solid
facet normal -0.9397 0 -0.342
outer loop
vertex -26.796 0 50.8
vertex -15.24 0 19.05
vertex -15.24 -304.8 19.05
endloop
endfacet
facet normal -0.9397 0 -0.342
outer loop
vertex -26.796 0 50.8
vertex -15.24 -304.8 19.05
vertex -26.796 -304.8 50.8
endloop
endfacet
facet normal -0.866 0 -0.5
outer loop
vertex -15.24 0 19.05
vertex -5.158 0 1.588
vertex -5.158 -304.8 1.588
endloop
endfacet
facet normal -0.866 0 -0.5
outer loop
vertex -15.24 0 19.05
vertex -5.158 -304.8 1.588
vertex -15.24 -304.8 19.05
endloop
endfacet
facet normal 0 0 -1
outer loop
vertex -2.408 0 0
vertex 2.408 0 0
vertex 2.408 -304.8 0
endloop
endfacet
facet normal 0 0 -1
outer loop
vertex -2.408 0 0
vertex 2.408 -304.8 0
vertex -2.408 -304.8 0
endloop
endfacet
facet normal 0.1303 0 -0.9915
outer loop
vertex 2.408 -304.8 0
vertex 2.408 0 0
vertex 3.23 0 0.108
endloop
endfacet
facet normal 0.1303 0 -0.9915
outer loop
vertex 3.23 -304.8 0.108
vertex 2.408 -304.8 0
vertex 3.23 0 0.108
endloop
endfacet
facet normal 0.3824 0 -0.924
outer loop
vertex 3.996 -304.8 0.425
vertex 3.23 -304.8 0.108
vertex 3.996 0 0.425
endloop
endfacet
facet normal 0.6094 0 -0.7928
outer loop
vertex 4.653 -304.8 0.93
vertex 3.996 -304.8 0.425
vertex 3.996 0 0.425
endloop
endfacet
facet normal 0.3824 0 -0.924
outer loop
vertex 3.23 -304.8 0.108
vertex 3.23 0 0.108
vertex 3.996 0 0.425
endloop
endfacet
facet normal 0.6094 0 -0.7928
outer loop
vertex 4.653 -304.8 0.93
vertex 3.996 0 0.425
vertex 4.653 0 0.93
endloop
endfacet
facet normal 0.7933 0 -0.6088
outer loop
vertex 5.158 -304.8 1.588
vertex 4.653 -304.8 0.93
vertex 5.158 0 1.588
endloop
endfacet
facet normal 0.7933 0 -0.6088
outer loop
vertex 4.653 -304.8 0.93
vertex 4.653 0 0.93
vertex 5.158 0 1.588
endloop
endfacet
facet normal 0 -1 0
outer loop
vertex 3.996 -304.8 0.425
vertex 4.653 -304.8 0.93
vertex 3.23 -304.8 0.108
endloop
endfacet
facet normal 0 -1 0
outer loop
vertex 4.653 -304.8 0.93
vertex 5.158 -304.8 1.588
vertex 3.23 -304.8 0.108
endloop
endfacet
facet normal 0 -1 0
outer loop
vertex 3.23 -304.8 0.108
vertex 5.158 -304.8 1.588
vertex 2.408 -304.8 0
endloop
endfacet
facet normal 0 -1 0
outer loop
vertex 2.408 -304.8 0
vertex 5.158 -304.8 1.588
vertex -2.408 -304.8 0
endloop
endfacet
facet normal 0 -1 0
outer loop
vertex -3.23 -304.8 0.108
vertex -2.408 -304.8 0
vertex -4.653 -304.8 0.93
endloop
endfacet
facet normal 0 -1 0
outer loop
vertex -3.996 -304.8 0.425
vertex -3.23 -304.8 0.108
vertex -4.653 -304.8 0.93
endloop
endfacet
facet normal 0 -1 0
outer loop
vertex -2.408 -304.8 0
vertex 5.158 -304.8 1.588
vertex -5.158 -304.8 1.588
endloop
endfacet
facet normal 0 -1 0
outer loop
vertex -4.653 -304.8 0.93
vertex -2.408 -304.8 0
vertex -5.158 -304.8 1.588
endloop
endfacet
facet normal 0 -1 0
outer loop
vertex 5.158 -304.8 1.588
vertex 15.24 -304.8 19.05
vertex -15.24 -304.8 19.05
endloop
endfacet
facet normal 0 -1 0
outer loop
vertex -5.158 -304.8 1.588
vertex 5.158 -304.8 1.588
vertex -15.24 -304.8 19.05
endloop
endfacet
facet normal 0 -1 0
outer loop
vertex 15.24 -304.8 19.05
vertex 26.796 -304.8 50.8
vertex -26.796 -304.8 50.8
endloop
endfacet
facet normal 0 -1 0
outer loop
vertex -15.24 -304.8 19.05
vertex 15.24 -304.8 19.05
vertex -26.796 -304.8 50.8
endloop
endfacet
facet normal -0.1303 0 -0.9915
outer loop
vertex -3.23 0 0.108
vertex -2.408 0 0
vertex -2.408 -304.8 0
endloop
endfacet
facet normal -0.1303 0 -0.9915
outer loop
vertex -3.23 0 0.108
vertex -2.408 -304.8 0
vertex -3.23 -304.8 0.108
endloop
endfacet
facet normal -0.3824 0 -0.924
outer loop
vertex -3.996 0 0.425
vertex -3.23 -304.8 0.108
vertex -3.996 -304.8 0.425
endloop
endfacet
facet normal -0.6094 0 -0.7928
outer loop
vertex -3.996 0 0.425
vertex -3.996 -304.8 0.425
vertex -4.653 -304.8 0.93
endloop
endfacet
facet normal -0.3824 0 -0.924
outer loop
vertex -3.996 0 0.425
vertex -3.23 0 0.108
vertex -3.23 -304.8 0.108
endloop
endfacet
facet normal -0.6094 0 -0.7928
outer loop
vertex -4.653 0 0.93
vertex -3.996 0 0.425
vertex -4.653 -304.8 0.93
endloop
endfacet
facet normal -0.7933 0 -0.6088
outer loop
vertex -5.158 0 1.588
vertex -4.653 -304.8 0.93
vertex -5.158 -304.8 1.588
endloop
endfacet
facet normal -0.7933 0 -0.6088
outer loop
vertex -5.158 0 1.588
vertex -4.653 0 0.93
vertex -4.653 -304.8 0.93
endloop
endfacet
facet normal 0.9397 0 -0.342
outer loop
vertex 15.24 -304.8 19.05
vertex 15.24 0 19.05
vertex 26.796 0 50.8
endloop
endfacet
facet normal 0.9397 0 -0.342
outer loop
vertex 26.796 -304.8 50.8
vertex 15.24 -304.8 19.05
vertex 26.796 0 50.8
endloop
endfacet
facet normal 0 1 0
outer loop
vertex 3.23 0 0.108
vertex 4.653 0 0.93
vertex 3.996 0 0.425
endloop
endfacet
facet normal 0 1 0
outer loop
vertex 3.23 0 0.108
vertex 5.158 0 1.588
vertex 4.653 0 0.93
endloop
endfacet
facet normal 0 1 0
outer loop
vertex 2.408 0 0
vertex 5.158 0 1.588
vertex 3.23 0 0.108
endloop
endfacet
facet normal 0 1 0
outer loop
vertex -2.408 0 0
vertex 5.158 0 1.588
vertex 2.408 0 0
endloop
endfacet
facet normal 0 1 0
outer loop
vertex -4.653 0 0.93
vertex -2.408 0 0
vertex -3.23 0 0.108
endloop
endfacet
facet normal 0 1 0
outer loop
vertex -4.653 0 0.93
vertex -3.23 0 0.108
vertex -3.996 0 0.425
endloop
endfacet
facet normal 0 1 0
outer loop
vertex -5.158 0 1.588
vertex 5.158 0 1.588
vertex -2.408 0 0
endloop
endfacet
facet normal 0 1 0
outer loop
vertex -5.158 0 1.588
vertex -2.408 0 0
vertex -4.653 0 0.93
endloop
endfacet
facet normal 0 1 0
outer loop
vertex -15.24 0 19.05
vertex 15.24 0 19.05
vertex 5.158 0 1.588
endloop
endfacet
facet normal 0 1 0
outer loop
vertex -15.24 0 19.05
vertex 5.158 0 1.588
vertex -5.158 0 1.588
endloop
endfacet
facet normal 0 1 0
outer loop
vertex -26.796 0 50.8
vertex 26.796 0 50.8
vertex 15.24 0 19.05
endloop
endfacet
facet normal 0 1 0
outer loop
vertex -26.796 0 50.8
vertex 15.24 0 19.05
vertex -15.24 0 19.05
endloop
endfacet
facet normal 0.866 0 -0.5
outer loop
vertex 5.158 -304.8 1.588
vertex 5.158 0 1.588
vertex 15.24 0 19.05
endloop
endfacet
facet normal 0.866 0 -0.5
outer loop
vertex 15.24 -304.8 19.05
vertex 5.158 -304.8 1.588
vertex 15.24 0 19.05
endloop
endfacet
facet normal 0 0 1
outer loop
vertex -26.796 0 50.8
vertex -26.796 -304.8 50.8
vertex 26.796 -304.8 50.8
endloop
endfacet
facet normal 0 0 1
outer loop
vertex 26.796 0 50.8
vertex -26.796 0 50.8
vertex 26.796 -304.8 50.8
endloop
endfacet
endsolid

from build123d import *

# Parameters (mm, degrees)
F1_DEPTH = 304.8


with BuildPart() as f1:
    # F0 (on Front) → F1 (new body)
    with BuildSketch(Plane.XZ):
        with BuildLine():
            Line((0, 50.8), (0, 0))
            Line((0, 0), (2.40839, 0))
            ThreePointArc((2.40839, 0), (3.99589, 0.425369), (5.158021, 1.5875))
            Line((5.158021, 1.5875), (15.24, 19.05))
            Line((15.24, 19.05), (26.796055, 50.8))
            Line((26.796055, 50.8), (0, 50.8))
        make_face()
    extrude(amount=F1_DEPTH)

    # F2: F1 across face


with BuildPart() as f1_1:
    add(f1.part)
    add(f1.part.mirror(Plane(origin=(0, -152.4, 25.4), x_dir=(0, -1, 0), z_dir=(-1, 0, 0))))


solid = f1_1.part
